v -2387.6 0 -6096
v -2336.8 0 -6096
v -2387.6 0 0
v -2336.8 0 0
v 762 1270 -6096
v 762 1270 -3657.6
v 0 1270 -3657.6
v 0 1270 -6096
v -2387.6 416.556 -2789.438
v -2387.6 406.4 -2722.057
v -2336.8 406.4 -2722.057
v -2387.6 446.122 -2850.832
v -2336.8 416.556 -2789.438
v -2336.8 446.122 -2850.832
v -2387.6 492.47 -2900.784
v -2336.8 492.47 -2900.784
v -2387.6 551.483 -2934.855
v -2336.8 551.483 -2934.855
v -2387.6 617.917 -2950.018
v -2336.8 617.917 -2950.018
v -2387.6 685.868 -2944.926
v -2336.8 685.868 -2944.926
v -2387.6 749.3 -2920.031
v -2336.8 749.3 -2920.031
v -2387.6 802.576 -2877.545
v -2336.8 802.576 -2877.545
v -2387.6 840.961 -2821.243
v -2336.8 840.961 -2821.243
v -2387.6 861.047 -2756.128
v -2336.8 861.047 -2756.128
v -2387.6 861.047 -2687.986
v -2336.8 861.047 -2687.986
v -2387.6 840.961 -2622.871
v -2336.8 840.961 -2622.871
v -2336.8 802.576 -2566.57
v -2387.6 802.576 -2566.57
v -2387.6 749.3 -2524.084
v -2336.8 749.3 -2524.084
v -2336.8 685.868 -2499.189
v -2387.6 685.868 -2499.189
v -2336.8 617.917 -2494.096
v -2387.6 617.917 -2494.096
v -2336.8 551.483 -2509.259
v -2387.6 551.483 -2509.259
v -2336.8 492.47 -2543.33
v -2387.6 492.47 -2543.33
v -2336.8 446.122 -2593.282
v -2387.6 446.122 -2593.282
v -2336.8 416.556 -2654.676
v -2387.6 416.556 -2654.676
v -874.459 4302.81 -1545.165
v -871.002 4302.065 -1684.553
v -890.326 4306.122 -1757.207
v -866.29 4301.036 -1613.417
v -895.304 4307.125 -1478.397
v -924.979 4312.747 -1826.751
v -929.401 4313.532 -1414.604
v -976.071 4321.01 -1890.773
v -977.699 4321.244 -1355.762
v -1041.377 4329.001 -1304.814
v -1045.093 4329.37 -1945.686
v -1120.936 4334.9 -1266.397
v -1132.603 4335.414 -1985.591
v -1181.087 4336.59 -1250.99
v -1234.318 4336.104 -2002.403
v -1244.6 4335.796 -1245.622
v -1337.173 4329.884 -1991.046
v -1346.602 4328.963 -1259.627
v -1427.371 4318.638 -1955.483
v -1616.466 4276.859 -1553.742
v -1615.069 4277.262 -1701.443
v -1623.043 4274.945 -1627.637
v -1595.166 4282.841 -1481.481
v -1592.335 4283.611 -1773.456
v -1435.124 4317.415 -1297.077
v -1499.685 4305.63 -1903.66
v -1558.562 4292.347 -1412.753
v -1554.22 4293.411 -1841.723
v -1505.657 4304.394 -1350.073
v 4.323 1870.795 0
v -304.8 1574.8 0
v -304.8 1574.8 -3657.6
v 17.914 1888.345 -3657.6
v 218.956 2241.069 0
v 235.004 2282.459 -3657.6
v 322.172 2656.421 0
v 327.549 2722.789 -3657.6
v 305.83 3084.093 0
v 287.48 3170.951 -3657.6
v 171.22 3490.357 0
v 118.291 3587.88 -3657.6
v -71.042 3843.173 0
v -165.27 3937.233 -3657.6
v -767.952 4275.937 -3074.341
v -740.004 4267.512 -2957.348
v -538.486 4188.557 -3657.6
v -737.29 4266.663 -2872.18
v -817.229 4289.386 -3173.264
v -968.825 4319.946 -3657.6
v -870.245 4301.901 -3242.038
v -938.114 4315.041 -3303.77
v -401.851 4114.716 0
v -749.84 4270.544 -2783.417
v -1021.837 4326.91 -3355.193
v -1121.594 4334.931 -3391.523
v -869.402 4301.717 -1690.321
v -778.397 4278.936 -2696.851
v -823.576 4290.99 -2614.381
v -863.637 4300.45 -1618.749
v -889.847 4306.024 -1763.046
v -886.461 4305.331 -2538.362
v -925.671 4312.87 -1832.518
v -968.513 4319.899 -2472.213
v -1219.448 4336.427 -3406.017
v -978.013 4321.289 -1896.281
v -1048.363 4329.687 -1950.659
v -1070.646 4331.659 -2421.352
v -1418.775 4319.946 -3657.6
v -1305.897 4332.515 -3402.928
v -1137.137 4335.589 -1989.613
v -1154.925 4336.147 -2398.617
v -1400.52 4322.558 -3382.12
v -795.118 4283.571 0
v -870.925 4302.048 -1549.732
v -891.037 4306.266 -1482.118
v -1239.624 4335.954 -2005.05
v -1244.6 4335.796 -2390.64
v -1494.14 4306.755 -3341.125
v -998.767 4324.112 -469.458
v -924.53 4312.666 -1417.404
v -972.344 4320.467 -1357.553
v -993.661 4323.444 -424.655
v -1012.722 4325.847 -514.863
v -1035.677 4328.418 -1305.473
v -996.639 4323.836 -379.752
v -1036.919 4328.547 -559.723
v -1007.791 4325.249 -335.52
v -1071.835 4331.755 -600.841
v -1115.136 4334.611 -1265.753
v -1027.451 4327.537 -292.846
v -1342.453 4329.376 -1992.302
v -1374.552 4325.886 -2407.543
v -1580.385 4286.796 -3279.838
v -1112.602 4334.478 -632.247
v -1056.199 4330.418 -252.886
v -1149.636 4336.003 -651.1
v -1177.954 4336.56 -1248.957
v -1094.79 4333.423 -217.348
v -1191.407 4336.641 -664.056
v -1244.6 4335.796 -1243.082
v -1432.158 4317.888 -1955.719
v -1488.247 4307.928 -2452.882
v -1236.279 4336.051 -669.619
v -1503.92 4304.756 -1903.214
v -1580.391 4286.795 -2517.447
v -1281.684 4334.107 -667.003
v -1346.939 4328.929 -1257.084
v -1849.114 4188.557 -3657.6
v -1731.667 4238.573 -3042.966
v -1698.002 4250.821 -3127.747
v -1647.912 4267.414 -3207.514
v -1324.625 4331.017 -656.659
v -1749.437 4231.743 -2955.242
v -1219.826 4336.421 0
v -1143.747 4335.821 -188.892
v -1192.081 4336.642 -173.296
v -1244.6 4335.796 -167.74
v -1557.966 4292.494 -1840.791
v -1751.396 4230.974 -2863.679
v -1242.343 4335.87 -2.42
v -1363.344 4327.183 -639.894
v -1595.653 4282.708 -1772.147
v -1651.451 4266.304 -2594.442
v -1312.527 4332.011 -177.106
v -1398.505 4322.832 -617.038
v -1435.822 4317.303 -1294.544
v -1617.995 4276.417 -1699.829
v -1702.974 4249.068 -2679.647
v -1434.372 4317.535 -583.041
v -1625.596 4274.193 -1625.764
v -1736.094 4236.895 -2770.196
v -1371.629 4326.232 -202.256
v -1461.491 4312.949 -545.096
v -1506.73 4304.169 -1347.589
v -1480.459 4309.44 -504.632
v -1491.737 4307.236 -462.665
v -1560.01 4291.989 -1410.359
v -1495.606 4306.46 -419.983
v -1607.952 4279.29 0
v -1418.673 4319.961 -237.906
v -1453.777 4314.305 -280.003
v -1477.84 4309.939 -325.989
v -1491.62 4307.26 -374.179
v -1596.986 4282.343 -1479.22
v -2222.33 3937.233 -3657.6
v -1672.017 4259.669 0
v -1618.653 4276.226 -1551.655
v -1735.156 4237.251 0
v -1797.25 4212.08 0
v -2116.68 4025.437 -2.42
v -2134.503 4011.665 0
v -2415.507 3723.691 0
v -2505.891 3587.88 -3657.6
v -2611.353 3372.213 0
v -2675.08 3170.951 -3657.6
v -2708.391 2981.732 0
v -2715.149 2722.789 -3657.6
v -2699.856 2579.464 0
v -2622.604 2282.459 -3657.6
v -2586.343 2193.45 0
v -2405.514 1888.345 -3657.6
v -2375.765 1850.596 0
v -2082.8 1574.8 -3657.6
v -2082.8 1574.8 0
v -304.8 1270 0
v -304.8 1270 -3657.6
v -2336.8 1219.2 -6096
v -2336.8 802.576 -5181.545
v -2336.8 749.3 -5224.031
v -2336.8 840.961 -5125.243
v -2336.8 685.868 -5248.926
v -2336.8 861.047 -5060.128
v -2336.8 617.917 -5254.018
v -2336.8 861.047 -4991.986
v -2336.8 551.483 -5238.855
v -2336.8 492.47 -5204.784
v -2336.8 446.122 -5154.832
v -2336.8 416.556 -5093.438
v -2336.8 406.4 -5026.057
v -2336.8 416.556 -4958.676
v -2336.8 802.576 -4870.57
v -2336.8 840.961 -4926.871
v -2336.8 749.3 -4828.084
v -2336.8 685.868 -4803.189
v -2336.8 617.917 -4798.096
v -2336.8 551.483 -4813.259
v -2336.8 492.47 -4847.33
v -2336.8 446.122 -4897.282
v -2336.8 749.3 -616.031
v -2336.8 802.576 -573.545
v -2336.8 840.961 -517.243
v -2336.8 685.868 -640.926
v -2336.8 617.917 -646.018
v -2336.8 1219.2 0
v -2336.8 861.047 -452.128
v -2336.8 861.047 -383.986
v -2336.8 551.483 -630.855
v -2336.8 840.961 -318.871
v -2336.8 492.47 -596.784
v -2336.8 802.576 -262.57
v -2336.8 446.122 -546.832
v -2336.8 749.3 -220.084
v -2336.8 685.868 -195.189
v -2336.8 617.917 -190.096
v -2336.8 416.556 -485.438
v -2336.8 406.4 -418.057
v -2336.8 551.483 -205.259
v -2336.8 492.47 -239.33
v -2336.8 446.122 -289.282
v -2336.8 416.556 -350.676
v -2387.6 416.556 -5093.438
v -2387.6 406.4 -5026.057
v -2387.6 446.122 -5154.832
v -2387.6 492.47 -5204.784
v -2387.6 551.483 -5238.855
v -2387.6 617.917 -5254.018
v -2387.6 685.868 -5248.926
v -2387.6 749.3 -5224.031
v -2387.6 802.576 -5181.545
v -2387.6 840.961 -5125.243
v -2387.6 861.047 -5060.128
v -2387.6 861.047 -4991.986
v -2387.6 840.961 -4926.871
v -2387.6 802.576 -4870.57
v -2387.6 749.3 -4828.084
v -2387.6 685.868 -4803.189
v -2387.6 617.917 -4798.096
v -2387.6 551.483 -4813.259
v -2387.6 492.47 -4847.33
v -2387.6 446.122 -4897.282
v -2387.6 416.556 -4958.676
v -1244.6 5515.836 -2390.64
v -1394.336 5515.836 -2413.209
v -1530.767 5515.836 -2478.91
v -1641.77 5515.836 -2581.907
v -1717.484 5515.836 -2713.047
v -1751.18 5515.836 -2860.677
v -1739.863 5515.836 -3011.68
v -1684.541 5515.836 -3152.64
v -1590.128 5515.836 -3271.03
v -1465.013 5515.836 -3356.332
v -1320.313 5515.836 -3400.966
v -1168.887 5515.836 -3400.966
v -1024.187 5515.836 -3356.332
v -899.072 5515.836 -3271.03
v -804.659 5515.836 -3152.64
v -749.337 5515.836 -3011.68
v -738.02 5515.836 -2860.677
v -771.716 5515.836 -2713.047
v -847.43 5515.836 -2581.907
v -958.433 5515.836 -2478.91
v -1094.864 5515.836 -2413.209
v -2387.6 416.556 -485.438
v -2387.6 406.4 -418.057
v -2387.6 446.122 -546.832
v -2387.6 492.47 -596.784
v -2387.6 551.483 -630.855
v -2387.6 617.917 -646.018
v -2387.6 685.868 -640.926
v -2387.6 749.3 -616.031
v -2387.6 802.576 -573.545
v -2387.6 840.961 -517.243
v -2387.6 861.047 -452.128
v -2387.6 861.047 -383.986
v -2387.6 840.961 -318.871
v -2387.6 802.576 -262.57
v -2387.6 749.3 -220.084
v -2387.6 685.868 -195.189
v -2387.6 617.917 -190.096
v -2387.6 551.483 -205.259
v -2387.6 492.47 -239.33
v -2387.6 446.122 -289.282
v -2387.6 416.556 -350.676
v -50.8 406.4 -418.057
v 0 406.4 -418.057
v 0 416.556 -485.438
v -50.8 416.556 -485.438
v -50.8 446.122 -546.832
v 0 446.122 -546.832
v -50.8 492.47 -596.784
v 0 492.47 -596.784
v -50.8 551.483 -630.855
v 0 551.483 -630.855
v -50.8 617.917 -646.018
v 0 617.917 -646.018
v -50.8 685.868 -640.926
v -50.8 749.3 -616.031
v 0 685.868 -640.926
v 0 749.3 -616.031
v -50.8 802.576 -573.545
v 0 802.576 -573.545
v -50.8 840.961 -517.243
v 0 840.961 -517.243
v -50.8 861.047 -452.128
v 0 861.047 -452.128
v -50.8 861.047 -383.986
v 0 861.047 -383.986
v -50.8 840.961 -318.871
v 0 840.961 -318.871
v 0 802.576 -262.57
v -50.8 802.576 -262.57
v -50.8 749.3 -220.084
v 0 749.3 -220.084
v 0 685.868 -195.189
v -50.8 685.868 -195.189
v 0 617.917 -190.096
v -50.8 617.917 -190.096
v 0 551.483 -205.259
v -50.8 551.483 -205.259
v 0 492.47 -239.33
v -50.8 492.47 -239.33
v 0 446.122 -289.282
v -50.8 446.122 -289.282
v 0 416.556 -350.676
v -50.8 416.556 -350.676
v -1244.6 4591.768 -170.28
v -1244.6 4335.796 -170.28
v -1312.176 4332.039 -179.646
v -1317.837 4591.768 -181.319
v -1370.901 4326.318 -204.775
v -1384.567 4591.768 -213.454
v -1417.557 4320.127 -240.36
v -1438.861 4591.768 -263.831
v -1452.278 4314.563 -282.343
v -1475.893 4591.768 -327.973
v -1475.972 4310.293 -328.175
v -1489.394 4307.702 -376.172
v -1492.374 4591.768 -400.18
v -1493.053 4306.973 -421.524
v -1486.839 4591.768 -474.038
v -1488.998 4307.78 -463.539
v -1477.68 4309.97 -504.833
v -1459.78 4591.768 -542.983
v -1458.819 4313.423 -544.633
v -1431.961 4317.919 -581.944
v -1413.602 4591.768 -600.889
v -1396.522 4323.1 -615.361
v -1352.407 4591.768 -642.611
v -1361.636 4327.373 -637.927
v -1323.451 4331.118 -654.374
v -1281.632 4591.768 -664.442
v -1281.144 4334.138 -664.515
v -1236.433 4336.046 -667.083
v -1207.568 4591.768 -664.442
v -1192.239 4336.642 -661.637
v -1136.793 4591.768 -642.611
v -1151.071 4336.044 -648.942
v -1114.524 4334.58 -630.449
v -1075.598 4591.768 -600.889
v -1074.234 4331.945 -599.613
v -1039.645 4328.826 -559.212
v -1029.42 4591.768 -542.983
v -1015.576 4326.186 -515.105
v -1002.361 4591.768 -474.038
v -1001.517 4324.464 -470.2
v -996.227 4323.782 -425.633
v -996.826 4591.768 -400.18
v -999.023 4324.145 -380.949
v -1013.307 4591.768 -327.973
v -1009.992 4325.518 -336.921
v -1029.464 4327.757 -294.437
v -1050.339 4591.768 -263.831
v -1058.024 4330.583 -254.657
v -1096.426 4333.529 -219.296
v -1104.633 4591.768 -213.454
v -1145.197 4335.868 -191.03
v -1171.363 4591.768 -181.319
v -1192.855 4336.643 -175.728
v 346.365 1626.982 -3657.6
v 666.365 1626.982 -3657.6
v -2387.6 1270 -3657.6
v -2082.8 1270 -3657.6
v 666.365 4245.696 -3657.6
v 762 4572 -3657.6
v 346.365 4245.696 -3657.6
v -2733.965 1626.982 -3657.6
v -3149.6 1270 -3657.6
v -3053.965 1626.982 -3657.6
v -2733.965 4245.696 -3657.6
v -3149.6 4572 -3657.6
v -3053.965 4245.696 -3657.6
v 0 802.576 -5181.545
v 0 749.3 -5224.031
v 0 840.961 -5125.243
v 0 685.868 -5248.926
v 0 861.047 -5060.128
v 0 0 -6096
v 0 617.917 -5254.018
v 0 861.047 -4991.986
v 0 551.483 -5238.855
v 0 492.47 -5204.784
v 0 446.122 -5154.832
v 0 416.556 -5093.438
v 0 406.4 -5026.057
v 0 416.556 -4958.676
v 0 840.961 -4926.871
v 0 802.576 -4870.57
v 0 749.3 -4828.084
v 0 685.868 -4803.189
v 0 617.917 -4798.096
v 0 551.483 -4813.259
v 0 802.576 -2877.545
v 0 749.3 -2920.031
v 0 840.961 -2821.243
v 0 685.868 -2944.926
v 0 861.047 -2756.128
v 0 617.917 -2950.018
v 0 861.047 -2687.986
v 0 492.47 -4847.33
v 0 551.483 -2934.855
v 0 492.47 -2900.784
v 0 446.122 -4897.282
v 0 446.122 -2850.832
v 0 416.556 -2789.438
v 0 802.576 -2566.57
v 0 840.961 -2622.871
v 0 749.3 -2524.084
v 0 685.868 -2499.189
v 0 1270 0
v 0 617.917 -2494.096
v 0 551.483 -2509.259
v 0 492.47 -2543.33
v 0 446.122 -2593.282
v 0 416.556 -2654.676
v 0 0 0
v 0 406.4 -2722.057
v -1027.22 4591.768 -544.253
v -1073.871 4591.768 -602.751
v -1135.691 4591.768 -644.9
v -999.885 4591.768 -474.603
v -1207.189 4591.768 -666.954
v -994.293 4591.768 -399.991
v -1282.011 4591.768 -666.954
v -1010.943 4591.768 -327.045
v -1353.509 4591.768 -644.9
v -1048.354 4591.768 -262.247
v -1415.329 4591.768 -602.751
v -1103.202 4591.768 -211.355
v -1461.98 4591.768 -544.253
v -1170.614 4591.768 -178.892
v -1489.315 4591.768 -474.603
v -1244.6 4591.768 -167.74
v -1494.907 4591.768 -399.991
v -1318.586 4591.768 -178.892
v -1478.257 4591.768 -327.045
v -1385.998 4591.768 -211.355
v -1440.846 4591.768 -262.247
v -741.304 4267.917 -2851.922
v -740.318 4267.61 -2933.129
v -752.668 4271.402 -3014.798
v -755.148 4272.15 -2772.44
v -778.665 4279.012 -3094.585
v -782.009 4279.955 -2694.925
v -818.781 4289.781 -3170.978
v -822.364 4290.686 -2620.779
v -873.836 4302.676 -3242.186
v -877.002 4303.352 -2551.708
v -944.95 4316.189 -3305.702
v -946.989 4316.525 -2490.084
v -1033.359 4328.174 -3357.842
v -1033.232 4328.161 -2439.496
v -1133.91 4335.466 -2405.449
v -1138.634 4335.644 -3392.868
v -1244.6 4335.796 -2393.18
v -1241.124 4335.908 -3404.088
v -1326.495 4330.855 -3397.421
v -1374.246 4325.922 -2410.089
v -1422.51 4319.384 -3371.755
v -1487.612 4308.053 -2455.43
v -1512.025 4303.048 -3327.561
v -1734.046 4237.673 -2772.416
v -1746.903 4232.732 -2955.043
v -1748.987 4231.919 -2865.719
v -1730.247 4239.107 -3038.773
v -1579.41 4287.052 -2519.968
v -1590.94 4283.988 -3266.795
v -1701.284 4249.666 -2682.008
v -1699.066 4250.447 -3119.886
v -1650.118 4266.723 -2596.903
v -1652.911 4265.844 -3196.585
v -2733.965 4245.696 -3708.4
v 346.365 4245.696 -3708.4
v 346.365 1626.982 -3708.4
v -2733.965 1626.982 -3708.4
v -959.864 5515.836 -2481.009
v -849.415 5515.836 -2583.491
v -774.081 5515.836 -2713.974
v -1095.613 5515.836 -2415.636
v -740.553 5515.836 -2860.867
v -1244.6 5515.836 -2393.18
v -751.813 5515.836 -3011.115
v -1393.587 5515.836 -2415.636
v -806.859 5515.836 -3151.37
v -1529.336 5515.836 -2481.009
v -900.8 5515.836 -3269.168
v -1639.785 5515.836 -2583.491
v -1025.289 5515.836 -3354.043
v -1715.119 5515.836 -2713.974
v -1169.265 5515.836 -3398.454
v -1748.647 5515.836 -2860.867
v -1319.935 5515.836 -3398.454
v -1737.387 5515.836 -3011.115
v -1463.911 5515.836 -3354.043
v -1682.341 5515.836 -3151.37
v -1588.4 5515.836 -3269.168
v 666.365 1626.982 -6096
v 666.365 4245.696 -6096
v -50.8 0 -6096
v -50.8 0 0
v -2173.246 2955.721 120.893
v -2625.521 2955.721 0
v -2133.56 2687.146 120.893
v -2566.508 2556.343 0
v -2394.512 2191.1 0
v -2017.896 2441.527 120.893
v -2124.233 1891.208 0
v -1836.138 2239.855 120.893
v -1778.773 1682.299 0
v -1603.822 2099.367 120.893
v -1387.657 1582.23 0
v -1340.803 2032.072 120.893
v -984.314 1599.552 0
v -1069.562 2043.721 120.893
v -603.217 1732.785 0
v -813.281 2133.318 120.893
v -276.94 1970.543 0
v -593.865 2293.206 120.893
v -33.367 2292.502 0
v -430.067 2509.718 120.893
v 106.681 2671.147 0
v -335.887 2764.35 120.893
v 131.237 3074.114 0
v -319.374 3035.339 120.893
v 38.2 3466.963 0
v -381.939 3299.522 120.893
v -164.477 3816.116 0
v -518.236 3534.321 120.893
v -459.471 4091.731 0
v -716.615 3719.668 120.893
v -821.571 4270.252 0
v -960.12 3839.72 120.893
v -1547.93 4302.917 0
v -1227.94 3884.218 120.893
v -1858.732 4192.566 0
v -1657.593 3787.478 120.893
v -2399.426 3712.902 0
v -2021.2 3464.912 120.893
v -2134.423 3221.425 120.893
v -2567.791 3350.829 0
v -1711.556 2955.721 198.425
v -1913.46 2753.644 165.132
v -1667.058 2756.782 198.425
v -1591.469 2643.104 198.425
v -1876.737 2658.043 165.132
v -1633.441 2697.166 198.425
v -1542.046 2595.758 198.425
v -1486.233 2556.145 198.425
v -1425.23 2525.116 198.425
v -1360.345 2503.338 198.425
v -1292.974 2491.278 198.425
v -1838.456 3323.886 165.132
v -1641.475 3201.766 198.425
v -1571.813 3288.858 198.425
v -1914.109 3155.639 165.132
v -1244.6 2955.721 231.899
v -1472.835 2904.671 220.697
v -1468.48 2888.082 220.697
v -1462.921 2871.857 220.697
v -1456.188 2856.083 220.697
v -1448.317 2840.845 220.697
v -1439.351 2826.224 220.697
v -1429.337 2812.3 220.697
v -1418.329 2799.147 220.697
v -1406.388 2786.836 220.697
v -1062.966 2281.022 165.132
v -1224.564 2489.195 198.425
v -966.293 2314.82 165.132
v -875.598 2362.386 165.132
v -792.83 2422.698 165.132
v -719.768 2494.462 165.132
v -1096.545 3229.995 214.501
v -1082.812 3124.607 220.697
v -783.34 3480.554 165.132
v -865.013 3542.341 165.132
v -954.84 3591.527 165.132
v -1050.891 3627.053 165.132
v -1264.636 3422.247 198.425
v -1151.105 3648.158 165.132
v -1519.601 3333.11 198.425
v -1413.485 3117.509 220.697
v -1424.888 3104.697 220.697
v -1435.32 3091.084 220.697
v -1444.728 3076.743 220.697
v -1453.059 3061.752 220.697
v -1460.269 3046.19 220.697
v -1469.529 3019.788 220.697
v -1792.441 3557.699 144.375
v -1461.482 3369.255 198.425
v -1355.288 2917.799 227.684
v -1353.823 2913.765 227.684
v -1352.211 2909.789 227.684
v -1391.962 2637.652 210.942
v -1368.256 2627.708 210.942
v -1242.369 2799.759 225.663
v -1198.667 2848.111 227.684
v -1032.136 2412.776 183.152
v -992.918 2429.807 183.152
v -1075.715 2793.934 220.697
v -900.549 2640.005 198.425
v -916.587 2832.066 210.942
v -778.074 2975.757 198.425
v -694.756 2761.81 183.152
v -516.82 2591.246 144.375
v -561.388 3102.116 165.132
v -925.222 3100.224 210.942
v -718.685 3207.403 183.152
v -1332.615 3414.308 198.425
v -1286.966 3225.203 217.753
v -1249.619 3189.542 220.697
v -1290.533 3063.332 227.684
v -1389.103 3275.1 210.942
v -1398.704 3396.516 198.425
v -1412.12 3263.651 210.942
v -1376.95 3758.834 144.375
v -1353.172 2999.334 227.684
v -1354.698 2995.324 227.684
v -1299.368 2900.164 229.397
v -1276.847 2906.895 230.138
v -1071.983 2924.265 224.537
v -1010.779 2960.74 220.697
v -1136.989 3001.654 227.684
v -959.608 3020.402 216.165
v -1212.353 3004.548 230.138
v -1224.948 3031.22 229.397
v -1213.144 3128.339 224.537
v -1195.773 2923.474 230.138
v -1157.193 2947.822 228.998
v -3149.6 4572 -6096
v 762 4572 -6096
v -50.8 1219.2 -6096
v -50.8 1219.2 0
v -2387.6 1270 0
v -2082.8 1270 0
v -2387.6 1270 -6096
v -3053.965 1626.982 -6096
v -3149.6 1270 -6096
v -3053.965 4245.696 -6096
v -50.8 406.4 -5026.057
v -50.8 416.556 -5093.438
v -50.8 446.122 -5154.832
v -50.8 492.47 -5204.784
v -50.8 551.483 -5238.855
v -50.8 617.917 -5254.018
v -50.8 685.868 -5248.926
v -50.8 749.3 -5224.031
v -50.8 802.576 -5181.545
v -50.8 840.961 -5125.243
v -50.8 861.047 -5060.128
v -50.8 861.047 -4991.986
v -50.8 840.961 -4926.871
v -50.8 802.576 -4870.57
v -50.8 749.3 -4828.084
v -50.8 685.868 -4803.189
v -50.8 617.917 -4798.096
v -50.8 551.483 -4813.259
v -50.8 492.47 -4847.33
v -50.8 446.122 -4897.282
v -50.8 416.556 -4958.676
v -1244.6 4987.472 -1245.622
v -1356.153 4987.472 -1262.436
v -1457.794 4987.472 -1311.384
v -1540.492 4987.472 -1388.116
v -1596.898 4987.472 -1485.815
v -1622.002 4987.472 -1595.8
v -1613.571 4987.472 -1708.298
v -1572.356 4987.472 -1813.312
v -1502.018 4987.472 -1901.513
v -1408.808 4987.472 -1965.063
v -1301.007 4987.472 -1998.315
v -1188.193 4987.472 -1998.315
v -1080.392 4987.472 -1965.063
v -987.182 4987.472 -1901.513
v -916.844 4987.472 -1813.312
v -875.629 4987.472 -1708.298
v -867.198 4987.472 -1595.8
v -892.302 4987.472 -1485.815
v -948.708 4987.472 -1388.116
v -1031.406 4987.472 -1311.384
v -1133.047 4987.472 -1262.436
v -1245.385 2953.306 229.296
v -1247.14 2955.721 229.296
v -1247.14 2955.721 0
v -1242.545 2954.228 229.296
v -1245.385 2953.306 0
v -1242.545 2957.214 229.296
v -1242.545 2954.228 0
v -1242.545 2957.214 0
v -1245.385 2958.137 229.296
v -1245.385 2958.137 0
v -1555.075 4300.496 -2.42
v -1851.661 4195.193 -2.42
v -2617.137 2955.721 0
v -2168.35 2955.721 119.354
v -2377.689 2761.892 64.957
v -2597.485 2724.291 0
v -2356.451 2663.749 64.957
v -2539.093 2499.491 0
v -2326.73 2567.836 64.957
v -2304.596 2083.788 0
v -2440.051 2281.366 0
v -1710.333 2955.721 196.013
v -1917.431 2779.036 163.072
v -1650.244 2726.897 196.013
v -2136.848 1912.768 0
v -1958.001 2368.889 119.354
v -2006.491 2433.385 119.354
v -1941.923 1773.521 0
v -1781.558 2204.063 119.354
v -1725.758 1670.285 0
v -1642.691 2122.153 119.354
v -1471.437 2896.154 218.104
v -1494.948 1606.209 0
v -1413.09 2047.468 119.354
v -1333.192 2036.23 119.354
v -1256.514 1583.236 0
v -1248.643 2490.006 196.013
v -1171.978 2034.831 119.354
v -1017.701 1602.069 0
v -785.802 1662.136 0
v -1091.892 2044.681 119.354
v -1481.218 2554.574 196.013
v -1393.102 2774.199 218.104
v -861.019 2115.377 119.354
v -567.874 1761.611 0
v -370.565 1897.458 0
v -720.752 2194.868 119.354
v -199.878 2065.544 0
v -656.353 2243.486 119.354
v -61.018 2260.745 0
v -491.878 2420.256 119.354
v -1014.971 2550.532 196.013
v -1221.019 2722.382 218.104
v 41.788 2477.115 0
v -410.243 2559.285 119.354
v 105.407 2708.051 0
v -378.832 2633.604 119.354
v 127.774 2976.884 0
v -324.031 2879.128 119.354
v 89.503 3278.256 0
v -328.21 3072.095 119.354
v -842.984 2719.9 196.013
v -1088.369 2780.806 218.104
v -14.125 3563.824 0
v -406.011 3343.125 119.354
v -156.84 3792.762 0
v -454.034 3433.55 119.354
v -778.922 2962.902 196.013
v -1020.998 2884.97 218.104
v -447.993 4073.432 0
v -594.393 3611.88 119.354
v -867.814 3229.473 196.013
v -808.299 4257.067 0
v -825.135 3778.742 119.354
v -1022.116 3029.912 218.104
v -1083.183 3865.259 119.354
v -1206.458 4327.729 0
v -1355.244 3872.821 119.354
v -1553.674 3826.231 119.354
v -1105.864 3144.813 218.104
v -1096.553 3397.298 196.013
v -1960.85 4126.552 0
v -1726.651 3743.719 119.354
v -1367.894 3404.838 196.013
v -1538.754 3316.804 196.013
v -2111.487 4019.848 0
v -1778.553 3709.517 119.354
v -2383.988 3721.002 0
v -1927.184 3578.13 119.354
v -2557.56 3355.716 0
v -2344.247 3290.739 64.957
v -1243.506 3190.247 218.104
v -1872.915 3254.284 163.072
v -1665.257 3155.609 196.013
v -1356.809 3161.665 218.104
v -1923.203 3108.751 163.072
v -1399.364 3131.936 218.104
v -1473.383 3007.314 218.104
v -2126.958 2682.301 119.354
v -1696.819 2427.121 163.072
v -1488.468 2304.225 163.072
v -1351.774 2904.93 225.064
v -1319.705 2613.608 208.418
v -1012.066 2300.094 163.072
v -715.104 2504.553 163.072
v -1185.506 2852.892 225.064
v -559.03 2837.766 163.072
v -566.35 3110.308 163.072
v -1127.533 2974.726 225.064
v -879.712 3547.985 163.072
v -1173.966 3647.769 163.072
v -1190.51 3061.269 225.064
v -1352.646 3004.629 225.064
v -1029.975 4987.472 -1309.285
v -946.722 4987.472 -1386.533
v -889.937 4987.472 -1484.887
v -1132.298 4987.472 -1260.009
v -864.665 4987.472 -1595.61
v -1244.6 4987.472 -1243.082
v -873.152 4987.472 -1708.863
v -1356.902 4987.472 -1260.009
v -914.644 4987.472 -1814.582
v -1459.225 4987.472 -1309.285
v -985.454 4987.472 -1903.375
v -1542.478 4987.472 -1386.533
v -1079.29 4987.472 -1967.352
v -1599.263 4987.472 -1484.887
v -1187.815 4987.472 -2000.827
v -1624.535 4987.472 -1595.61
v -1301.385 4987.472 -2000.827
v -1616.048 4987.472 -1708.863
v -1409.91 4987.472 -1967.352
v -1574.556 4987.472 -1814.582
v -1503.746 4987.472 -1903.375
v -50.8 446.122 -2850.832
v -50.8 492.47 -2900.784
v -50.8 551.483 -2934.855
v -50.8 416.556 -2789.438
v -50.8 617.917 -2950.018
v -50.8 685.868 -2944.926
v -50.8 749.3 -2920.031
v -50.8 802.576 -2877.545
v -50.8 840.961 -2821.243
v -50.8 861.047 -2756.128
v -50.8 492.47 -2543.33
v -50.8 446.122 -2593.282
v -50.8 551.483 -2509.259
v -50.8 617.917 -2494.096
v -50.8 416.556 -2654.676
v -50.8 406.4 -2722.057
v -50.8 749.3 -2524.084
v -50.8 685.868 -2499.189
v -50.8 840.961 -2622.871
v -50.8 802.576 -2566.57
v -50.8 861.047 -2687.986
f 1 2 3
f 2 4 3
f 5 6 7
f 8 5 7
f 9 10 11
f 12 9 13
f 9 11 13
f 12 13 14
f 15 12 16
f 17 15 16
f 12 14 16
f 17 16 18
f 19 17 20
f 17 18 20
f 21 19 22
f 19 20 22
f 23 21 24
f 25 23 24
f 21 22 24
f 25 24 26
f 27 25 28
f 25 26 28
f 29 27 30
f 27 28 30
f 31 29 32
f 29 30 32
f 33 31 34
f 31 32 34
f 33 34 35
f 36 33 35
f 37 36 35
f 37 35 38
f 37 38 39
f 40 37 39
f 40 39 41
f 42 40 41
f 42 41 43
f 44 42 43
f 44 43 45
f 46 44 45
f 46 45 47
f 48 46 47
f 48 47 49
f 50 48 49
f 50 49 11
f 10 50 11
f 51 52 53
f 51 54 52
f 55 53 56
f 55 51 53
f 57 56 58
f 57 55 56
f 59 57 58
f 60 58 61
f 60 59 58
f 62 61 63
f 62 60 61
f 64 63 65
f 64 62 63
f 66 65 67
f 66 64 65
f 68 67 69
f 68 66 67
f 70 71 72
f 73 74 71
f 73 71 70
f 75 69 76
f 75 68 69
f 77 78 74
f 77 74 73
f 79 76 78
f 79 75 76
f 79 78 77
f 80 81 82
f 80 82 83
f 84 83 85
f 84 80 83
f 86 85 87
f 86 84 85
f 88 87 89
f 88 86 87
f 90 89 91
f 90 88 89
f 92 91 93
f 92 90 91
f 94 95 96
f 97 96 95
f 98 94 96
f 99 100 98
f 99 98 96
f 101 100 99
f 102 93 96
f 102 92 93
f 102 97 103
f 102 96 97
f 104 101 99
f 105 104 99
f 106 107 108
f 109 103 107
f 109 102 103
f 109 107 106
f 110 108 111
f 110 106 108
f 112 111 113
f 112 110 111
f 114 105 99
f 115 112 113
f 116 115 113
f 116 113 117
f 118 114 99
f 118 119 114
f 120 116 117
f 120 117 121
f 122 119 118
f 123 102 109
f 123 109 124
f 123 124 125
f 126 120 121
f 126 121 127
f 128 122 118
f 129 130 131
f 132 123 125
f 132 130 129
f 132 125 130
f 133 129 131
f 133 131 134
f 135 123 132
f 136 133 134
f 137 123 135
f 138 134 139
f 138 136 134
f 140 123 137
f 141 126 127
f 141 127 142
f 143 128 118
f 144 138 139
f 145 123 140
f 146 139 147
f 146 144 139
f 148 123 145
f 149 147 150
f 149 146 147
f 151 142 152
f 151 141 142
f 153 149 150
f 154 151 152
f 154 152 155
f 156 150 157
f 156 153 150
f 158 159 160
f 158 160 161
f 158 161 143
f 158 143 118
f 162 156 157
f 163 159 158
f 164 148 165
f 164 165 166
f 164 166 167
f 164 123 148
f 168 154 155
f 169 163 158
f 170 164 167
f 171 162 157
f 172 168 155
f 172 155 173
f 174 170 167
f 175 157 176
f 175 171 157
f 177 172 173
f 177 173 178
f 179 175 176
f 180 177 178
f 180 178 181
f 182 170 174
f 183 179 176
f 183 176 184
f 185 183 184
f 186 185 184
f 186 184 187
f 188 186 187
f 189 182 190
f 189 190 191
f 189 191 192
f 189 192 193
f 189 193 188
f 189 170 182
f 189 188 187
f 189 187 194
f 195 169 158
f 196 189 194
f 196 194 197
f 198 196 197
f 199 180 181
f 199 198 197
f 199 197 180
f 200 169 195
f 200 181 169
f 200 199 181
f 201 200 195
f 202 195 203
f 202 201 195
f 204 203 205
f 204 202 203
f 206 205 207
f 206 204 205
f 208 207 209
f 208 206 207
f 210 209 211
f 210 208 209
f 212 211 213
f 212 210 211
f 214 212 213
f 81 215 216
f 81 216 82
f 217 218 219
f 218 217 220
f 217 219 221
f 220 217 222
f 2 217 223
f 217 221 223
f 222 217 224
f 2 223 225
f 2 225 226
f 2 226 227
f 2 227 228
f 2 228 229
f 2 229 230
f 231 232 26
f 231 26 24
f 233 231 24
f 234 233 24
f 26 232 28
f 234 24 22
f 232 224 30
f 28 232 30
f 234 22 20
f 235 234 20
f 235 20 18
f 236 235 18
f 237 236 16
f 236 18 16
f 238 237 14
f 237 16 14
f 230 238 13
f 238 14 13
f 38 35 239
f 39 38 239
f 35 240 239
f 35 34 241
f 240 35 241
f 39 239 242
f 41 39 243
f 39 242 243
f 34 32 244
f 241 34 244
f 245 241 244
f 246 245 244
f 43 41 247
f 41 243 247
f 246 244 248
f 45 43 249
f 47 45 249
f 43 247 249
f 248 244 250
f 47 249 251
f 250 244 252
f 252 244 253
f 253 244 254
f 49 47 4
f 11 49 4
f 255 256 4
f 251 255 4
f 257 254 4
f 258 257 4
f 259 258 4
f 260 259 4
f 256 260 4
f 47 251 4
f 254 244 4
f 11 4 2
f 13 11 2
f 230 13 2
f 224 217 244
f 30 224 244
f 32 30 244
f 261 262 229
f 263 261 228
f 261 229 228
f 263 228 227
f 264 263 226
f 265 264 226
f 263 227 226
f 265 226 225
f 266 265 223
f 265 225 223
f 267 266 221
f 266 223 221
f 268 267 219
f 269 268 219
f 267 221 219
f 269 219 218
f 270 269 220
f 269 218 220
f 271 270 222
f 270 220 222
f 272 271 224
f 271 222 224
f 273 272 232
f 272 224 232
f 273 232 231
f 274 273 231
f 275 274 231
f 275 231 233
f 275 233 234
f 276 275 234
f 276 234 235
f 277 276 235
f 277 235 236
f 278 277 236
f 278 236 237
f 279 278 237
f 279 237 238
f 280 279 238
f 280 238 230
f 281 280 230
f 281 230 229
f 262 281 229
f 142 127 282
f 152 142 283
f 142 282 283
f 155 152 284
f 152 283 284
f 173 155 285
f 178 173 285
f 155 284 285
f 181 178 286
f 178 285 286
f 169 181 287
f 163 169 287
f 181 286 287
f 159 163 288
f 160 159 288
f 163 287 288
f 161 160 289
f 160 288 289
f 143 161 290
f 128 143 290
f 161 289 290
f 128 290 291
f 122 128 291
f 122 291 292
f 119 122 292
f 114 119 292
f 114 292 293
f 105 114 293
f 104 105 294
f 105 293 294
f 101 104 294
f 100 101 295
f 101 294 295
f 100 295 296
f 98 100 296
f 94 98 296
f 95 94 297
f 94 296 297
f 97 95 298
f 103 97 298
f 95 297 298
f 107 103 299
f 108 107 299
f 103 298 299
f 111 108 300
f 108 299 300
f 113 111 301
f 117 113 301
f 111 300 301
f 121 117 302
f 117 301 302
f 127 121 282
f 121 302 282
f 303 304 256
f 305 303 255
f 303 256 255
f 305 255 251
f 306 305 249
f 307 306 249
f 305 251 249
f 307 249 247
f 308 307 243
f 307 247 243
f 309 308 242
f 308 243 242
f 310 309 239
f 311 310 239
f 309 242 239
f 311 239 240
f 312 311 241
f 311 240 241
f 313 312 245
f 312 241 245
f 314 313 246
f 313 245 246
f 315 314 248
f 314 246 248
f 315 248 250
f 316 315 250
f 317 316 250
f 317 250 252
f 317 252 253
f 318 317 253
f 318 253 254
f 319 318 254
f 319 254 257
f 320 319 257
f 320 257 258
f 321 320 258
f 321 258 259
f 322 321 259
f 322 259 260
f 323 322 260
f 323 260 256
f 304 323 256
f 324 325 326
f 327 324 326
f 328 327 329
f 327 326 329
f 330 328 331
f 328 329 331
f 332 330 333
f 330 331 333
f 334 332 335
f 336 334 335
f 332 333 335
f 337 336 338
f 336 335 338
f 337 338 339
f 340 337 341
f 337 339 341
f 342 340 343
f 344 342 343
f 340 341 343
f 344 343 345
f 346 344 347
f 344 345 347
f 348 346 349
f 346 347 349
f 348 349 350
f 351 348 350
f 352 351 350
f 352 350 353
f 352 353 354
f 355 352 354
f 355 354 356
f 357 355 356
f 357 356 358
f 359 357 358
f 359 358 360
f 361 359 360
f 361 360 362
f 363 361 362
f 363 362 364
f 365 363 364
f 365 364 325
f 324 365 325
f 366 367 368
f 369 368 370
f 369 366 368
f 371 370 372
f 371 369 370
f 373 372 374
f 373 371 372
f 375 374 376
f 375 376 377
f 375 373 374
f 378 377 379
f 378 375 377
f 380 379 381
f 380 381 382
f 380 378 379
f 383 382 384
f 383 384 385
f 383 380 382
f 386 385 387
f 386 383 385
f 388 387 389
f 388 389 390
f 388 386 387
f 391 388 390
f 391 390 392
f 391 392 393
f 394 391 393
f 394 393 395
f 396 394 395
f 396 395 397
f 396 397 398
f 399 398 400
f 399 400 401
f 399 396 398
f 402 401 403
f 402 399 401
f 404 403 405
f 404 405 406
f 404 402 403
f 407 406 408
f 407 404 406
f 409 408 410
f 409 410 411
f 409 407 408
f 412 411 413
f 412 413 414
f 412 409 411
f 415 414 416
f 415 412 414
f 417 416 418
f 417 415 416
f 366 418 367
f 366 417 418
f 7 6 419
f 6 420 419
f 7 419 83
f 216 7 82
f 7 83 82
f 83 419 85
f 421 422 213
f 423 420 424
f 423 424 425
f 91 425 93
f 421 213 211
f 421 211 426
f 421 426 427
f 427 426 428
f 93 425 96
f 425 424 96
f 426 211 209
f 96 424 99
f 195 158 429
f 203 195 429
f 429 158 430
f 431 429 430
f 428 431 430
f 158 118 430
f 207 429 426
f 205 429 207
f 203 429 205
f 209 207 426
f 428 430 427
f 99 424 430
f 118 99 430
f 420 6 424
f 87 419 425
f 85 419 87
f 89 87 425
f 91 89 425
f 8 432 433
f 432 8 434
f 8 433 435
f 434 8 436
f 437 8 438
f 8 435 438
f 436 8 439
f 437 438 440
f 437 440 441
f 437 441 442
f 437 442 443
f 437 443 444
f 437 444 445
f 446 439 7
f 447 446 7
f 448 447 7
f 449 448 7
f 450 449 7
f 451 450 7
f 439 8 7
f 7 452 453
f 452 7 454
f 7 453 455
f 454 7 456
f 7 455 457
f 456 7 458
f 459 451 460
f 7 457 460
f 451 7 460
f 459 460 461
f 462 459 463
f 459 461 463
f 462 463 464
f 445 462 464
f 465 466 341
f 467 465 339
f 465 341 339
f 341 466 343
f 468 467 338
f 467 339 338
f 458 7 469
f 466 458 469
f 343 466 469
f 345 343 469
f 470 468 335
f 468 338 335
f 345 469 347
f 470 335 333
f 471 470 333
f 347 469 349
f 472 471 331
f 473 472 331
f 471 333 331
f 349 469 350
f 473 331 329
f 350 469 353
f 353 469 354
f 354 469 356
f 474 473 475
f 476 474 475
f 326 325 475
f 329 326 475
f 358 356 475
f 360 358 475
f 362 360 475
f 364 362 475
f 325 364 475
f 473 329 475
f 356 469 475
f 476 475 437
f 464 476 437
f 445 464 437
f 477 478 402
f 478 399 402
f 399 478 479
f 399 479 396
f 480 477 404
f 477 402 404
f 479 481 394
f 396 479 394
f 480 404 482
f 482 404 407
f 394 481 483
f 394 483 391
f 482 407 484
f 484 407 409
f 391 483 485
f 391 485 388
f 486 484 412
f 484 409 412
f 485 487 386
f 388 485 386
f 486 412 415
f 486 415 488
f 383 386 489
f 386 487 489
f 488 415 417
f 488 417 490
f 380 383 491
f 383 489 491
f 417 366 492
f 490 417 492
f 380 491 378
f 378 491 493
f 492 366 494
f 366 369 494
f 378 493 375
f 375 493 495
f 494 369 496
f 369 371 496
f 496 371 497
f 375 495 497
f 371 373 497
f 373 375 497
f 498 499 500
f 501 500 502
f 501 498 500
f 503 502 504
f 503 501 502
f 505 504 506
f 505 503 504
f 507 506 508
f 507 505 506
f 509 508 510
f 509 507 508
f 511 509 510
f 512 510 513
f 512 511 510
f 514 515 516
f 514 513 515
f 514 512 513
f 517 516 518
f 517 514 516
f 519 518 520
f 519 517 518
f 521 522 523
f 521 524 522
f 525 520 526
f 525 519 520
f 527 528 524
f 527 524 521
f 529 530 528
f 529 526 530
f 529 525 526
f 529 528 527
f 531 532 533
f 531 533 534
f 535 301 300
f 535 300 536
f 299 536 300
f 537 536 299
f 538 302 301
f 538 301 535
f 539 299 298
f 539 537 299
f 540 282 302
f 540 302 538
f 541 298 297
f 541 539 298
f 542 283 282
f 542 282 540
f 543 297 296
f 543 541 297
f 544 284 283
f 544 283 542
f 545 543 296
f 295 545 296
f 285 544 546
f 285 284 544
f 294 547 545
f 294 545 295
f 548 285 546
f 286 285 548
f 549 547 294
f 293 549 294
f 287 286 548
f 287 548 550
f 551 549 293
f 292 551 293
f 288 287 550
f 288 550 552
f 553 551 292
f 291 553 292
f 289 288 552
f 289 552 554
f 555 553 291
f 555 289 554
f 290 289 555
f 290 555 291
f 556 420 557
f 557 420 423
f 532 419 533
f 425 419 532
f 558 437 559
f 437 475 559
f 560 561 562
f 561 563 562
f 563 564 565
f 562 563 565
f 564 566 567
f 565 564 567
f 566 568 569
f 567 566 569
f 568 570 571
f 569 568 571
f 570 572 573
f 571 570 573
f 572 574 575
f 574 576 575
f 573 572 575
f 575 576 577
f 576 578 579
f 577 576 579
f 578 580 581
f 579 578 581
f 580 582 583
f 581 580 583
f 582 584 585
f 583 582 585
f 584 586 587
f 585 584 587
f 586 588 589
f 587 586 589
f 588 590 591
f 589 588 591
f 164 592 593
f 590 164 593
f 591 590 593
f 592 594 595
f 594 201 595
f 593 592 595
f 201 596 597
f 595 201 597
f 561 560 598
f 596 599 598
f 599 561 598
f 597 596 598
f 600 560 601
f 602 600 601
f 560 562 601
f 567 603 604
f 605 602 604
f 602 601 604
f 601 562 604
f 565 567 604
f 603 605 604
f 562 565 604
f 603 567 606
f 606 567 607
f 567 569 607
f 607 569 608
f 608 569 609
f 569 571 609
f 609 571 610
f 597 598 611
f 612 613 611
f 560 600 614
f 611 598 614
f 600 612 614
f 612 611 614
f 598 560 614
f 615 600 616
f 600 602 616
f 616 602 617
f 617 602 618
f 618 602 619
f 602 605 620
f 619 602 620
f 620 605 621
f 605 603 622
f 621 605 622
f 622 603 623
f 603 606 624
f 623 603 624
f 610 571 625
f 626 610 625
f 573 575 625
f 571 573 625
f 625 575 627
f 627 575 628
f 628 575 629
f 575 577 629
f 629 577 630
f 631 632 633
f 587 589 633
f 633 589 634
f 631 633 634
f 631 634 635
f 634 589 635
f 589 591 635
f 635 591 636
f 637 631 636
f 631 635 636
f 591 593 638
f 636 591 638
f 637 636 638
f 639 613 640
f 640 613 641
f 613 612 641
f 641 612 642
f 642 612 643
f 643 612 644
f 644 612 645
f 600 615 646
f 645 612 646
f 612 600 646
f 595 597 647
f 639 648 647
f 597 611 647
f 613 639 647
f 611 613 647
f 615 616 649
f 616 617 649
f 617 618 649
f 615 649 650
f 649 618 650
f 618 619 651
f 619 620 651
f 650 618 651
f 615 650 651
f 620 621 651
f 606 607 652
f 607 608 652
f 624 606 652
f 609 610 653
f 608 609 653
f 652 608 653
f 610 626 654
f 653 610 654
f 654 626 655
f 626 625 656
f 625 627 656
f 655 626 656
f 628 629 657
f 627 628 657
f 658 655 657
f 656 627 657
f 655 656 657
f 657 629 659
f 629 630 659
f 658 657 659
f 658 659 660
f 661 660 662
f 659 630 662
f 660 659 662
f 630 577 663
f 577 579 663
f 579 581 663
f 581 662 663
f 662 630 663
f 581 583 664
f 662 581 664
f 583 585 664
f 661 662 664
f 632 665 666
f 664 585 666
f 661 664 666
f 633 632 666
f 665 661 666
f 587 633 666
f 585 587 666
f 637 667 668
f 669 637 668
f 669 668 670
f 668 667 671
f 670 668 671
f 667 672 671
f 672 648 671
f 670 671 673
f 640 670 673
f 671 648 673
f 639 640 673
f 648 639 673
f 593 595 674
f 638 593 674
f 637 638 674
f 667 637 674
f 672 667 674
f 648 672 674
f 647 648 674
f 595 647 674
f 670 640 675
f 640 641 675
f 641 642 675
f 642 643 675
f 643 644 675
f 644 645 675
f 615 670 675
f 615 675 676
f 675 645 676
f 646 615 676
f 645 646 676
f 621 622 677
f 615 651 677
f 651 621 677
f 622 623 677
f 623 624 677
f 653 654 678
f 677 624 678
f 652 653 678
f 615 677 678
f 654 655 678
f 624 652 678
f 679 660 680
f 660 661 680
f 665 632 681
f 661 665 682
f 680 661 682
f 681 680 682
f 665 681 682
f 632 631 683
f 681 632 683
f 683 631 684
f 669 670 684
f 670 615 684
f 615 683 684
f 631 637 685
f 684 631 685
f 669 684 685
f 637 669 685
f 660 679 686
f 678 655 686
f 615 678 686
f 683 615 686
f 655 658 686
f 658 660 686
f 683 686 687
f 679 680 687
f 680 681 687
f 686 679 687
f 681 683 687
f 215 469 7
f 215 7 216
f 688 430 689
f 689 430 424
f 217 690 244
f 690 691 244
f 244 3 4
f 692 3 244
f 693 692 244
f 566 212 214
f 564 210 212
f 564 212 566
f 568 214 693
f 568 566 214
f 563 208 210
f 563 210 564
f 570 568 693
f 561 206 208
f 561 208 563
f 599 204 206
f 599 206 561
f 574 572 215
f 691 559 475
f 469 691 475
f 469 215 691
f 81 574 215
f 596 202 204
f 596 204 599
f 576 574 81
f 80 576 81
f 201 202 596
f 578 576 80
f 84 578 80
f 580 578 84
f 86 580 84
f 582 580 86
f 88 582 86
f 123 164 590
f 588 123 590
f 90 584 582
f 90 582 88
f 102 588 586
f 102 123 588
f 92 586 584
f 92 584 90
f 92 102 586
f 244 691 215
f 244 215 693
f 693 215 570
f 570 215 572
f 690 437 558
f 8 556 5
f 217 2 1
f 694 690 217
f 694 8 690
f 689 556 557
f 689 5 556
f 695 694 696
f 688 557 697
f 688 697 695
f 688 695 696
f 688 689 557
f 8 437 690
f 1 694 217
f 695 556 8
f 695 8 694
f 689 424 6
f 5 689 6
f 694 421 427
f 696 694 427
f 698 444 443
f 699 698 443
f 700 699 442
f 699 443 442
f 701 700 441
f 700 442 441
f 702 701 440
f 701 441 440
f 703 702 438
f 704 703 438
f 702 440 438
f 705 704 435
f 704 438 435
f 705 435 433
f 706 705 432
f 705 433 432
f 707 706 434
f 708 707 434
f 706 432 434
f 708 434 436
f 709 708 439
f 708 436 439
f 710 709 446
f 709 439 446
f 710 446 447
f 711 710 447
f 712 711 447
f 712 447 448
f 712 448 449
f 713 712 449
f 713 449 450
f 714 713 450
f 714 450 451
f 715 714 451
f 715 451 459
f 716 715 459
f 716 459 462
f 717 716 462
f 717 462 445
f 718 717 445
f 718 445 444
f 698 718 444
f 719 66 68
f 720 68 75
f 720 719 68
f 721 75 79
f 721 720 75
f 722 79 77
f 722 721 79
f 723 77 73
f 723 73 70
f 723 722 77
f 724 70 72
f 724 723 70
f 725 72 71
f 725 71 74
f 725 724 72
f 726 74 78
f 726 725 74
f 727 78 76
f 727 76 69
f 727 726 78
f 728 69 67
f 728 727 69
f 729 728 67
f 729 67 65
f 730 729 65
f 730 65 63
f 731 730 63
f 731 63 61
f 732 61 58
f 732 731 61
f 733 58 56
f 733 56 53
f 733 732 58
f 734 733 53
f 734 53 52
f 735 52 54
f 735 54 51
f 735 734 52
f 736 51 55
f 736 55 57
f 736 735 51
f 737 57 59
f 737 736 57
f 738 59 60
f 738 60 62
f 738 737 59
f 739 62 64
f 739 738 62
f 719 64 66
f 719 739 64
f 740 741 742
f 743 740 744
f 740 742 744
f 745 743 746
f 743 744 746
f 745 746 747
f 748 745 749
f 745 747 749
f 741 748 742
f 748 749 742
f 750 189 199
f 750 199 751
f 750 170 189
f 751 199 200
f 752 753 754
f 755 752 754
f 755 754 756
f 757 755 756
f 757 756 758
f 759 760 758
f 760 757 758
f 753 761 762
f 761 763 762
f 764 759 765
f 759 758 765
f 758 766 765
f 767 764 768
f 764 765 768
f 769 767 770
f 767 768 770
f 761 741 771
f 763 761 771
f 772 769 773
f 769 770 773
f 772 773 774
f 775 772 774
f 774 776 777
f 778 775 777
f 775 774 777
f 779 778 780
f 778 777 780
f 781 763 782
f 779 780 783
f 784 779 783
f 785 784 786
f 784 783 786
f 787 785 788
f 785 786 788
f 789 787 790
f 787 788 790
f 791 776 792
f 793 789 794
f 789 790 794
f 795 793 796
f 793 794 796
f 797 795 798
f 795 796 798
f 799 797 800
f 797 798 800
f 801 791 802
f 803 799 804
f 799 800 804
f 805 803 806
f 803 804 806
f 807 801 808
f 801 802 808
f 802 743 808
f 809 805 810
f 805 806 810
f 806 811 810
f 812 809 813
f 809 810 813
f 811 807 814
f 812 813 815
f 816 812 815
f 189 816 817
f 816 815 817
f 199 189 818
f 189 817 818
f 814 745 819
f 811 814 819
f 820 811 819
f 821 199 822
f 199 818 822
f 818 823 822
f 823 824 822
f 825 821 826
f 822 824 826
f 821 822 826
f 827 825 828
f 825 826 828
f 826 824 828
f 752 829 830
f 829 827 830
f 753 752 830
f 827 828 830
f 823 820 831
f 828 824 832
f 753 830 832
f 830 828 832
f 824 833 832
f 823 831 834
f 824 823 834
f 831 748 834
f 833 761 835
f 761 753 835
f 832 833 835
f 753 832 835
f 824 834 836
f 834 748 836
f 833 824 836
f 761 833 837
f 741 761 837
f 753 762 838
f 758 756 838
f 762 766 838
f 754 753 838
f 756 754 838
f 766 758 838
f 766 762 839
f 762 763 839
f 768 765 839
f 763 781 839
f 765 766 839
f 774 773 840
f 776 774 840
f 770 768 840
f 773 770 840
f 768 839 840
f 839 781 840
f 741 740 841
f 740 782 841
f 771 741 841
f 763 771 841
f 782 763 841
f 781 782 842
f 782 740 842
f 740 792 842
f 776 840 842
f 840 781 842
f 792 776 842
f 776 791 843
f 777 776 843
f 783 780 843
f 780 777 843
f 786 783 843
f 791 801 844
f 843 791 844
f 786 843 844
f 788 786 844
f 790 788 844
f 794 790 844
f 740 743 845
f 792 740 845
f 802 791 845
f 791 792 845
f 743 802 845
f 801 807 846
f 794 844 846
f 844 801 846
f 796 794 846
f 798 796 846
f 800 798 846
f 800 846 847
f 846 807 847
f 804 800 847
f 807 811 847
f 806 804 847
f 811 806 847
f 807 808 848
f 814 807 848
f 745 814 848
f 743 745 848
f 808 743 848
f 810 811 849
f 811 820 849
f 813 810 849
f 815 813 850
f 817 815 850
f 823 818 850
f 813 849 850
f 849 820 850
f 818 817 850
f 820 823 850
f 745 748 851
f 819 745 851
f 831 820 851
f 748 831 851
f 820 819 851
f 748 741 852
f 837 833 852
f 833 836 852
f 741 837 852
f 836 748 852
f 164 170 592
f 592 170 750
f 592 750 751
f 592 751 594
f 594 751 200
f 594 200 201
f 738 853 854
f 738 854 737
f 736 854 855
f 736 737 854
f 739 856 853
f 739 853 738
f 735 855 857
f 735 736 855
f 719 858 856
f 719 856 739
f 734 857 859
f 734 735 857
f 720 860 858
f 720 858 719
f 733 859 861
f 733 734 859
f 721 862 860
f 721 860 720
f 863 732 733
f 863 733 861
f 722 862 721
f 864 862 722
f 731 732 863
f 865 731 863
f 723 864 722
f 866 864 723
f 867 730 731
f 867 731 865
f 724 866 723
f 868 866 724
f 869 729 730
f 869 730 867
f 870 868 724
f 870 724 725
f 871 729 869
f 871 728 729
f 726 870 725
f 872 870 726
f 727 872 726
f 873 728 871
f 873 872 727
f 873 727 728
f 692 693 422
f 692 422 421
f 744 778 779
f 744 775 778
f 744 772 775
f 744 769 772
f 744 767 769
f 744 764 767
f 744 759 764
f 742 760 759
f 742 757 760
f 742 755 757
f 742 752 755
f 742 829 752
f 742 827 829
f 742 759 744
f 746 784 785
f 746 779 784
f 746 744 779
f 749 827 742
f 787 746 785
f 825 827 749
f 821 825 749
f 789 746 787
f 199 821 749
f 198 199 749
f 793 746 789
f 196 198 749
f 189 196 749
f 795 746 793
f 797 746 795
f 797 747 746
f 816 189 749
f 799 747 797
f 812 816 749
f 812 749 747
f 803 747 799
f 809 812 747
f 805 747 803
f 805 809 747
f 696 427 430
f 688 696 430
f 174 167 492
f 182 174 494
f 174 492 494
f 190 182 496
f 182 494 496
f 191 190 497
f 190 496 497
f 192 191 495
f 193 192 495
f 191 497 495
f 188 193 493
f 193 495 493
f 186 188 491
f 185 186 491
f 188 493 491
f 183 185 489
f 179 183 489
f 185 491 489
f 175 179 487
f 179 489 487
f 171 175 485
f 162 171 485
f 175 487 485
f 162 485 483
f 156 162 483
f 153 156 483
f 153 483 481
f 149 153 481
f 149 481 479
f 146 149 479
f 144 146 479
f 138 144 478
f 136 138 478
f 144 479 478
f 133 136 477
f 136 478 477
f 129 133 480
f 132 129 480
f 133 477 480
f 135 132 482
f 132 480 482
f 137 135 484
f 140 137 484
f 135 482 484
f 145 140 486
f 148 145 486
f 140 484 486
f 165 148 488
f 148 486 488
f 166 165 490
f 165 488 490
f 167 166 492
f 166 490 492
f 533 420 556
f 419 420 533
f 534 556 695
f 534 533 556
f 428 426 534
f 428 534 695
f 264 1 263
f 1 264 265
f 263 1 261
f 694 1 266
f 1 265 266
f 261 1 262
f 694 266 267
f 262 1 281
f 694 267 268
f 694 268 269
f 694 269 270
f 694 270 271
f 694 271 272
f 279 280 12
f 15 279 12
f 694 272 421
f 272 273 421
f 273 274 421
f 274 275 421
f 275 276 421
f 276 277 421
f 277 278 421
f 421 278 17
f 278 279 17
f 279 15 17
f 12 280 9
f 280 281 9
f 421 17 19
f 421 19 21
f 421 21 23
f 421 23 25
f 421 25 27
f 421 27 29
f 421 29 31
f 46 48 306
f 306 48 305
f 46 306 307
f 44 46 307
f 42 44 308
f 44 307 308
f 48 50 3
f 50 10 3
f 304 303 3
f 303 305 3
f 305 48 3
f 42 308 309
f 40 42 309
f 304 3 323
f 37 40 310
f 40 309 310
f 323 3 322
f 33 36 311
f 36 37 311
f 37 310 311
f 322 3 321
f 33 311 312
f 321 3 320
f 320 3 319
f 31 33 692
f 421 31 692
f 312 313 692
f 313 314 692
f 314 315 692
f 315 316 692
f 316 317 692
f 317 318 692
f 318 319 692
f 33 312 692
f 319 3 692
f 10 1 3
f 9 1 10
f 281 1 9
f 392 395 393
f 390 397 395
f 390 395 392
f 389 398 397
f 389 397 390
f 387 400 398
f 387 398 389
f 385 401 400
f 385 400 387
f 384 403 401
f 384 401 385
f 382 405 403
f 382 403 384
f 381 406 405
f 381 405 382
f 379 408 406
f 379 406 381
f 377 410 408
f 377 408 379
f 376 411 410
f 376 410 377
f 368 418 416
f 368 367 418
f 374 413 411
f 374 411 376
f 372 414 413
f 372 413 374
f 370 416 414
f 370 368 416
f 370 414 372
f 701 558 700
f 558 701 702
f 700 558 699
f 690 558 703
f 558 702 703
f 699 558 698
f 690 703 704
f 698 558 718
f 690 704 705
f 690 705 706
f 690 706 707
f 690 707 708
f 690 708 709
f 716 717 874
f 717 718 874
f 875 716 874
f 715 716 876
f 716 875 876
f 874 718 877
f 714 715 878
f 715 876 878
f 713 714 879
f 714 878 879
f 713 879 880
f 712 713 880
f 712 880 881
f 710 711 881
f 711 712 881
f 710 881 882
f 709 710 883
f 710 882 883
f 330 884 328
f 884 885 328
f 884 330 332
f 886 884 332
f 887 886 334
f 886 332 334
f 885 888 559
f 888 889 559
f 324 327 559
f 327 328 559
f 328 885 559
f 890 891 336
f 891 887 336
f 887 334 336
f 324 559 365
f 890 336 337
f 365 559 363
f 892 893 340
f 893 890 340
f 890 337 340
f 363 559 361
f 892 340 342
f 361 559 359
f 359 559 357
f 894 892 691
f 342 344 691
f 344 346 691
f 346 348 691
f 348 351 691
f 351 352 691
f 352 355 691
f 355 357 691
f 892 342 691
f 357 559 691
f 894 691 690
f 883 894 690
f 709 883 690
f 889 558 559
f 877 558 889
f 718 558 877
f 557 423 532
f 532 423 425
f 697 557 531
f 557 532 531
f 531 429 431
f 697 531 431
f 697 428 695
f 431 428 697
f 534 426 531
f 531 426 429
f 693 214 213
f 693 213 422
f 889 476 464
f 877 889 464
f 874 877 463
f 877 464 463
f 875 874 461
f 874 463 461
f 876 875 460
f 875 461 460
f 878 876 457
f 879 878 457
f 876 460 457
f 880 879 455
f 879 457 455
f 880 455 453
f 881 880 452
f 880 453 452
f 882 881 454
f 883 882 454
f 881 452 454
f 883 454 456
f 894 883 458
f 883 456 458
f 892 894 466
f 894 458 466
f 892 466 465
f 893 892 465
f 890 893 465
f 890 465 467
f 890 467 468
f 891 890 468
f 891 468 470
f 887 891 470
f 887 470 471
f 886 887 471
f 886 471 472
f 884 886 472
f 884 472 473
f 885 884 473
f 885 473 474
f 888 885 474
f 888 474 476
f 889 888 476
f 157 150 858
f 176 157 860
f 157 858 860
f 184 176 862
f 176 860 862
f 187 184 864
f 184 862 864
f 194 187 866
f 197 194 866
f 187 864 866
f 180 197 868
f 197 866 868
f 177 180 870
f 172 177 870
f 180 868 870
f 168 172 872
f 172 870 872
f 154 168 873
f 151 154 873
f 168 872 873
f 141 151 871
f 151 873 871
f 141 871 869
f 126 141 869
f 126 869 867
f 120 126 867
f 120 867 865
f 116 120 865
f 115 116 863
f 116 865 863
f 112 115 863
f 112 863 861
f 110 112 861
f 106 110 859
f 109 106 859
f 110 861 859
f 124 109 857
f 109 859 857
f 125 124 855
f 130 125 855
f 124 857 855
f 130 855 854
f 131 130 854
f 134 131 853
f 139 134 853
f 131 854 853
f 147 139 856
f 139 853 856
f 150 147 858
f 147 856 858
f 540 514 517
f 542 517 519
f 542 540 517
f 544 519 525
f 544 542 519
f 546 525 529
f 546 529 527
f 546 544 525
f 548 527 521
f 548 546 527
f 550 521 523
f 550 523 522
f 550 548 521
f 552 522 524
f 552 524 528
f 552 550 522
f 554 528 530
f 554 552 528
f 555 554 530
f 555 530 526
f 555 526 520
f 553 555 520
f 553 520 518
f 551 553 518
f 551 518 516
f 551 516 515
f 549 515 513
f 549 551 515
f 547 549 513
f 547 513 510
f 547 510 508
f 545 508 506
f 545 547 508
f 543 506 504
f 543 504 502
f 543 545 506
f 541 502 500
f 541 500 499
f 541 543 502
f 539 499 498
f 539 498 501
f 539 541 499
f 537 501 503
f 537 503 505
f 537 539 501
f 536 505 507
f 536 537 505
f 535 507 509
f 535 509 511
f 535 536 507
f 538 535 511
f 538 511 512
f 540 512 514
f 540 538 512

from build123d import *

# Parameters (mm, degrees)
BOSS_EXTRUDE3_DEPTH     = 3657.6
SKETCH2_W               = 320
SKETCH2_H               = 2618.714829249
BOSS_EXTRUDE4_DEPTH     = 2438.4
SKETCH4_W               = 3080.33
SKETCH4_H               = 2618.714829249
CUT_EXTRUDE1_DEPTH      = 2387.6
SKETCH5_R               = 228.6
CUT_EXTRUDE2_DEPTH      = 2115.312
CUT_EXTRUDE2_DEPTH_BACK = 4484.116
SKETCH9_W               = 2.54
SKETCH9_H               = 970.788
SKETCH10_W              = 2.54
SKETCH10_H              = 1156.208
SKETCH11_W              = 2.54
SKETCH11_H              = 1727.2


with BuildPart() as part:
    # Sketch1 → Boss-Extrude3 (new body)
    with BuildSketch(Plane.XY):
        with BuildLine():
            Line((-50.8, 0), (0, 0))
            Line((0, 0), (0, 1270))
            Line((0, 1270), (-304.8, 1270))
            Line((-304.8, 1270), (-304.8, 1574.8))
            ThreePointArc((-304.8, 1574.8), (-1193.8, 4336.642881791), (-2082.8, 1574.8))
            Line((-2082.8, 1574.8), (-2082.8, 1270))
            Line((-2082.8, 1270), (-2387.6, 1270))
            Line((-2387.6, 1270), (-2387.6, 0))
            Line((-2387.6, 0), (-2336.8, 0))
            Line((-2336.8, 0), (-2336.8, 1219.2))
            Line((-2336.8, 1219.2), (-50.8, 1219.2))
            Line((-50.8, 1219.2), (-50.8, 0))
        make_face()
    extrude(amount=-BOSS_EXTRUDE3_DEPTH)

    # Sketch2 → Boss-Extrude4 (add)
    with BuildSketch(Plane(origin=(0, 0, -3657.6), x_dir=(-1, 0, 0), z_dir=(0, 0, -1))):
        Polygon((0, 1270), (0, 0), (50.8, 0), (50.8, 1219.2), (2336.8, 1219.2), (2336.8, 0), (2387.6, 0), (2387.6, 1270), (3149.6, 1270), (3149.6, 4572), (-762, 4572), (-762, 1270), align=None)
        with Locations((-506.365, 2936.339064801)):
            Rectangle(SKETCH2_W, SKETCH2_H, mode=Mode.SUBTRACT)
        with Locations((2893.965, 2936.339064801)):
            Rectangle(SKETCH2_W, SKETCH2_H, mode=Mode.SUBTRACT)
    extrude(amount=BOSS_EXTRUDE4_DEPTH)

    # Sketch4 → Cut-Extrude1 (cut)
    with BuildSketch(Plane(origin=(0, 0, -6096), x_dir=(-1, 0, 0), z_dir=(0, 0, -1))):
        with Locations((1193.8, 2936.339064801)):
            Rectangle(SKETCH4_W, SKETCH4_H)
    extrude(amount=-CUT_EXTRUDE1_DEPTH, mode=Mode.SUBTRACT)

    # Sketch5 → Cut-Extrude2 (cut, two sides)
    with BuildSketch(Plane(origin=(0, 0, 0), x_dir=(0, 0, -1), z_dir=(1, 0, 0))) as cut_extrude2_sk:
        with Locations(Location((5026.057168607, 635, 0), (0, 0, 270))):
            Circle(SKETCH5_R)
        with Locations(Location((2722.057168607, 635, 0), (0, 0, 270))):
            Circle(SKETCH5_R)
        with Locations(Location((418.057168607, 635, 0), (0, 0, 270))):
            Circle(SKETCH5_R)
    extrude(amount=CUT_EXTRUDE2_DEPTH, mode=Mode.SUBTRACT)
    extrude(cut_extrude2_sk.sketch, amount=-CUT_EXTRUDE2_DEPTH_BACK, mode=Mode.SUBTRACT)

    # Sketch9 → Revolve-Thin2 (revolve)
    with BuildSketch(Plane.ZY.offset(1244.6), mode=Mode.PRIVATE) as revolve_thin2_sk:
        with Locations((-668.487238084, 4106.373777006)):
            Rectangle(SKETCH9_W, SKETCH9_H)
    revolve(revolve_thin2_sk.sketch.rotate(Axis((-1244.6, 4552.900640391, -418.748581478), (0, -1, 0)), 180), axis=Axis((-1244.6, 4552.900640391, -418.748581478), (0, -1, 0)))

    # Sketch10 → Revolve-Thin3 (revolve)
    with BuildSketch(Plane.ZY.offset(1244.6)):
        with Locations((-1244.352427091, 4409.367926067)):
            Rectangle(SKETCH10_W, SKETCH10_H)
    revolve(axis=Axis((-1244.6, 4987.471926067, -1624.082427091), (0, -1, 0)))

    # Sketch11 → Revolve-Thin4 (revolve)
    with BuildSketch(Plane.ZY.offset(1244.6)):
        with Locations((-2391.909754716, 4652.235687928)):
            Rectangle(SKETCH11_W, SKETCH11_H)
    revolve(axis=Axis((-1244.6, 5515.835687928, -2898.639754716), (0, -1, 0)))

    # Sketch13 → Revolve-Thin5 (revolve)
    with BuildSketch(Plane.ZY.offset(1244.6), mode=Mode.PRIVATE) as revolve_thin5_sk:
        with BuildLine():
            Line((0, 2955.721440895), (231.899056111, 2955.721440895))
            ThreePointArc((231.899056111, 2955.721440895), (165.131589664, 3654.441337663), (0, 4336.642881791))
            Line((0, 4336.642881791), (-2.420009973, 4335.871421012))
            ThreePointArc((-2.420009973, 4335.871421012), (162.411023884, 3655.303753365), (229.296258404, 2958.261440895))
            Line((229.296258404, 2958.261440895), (0, 2958.261440895))
            Line((0, 2958.261440895), (0, 2955.721440895))
        make_face()
    revolve(revolve_thin5_sk.sketch.rotate(Axis((-1244.6, 2955.721440895, 0), (0, 0, 1)), 90), axis=Axis((-1244.6, 2955.721440895, 0), (0, 0, 1)))


solid = part.part
